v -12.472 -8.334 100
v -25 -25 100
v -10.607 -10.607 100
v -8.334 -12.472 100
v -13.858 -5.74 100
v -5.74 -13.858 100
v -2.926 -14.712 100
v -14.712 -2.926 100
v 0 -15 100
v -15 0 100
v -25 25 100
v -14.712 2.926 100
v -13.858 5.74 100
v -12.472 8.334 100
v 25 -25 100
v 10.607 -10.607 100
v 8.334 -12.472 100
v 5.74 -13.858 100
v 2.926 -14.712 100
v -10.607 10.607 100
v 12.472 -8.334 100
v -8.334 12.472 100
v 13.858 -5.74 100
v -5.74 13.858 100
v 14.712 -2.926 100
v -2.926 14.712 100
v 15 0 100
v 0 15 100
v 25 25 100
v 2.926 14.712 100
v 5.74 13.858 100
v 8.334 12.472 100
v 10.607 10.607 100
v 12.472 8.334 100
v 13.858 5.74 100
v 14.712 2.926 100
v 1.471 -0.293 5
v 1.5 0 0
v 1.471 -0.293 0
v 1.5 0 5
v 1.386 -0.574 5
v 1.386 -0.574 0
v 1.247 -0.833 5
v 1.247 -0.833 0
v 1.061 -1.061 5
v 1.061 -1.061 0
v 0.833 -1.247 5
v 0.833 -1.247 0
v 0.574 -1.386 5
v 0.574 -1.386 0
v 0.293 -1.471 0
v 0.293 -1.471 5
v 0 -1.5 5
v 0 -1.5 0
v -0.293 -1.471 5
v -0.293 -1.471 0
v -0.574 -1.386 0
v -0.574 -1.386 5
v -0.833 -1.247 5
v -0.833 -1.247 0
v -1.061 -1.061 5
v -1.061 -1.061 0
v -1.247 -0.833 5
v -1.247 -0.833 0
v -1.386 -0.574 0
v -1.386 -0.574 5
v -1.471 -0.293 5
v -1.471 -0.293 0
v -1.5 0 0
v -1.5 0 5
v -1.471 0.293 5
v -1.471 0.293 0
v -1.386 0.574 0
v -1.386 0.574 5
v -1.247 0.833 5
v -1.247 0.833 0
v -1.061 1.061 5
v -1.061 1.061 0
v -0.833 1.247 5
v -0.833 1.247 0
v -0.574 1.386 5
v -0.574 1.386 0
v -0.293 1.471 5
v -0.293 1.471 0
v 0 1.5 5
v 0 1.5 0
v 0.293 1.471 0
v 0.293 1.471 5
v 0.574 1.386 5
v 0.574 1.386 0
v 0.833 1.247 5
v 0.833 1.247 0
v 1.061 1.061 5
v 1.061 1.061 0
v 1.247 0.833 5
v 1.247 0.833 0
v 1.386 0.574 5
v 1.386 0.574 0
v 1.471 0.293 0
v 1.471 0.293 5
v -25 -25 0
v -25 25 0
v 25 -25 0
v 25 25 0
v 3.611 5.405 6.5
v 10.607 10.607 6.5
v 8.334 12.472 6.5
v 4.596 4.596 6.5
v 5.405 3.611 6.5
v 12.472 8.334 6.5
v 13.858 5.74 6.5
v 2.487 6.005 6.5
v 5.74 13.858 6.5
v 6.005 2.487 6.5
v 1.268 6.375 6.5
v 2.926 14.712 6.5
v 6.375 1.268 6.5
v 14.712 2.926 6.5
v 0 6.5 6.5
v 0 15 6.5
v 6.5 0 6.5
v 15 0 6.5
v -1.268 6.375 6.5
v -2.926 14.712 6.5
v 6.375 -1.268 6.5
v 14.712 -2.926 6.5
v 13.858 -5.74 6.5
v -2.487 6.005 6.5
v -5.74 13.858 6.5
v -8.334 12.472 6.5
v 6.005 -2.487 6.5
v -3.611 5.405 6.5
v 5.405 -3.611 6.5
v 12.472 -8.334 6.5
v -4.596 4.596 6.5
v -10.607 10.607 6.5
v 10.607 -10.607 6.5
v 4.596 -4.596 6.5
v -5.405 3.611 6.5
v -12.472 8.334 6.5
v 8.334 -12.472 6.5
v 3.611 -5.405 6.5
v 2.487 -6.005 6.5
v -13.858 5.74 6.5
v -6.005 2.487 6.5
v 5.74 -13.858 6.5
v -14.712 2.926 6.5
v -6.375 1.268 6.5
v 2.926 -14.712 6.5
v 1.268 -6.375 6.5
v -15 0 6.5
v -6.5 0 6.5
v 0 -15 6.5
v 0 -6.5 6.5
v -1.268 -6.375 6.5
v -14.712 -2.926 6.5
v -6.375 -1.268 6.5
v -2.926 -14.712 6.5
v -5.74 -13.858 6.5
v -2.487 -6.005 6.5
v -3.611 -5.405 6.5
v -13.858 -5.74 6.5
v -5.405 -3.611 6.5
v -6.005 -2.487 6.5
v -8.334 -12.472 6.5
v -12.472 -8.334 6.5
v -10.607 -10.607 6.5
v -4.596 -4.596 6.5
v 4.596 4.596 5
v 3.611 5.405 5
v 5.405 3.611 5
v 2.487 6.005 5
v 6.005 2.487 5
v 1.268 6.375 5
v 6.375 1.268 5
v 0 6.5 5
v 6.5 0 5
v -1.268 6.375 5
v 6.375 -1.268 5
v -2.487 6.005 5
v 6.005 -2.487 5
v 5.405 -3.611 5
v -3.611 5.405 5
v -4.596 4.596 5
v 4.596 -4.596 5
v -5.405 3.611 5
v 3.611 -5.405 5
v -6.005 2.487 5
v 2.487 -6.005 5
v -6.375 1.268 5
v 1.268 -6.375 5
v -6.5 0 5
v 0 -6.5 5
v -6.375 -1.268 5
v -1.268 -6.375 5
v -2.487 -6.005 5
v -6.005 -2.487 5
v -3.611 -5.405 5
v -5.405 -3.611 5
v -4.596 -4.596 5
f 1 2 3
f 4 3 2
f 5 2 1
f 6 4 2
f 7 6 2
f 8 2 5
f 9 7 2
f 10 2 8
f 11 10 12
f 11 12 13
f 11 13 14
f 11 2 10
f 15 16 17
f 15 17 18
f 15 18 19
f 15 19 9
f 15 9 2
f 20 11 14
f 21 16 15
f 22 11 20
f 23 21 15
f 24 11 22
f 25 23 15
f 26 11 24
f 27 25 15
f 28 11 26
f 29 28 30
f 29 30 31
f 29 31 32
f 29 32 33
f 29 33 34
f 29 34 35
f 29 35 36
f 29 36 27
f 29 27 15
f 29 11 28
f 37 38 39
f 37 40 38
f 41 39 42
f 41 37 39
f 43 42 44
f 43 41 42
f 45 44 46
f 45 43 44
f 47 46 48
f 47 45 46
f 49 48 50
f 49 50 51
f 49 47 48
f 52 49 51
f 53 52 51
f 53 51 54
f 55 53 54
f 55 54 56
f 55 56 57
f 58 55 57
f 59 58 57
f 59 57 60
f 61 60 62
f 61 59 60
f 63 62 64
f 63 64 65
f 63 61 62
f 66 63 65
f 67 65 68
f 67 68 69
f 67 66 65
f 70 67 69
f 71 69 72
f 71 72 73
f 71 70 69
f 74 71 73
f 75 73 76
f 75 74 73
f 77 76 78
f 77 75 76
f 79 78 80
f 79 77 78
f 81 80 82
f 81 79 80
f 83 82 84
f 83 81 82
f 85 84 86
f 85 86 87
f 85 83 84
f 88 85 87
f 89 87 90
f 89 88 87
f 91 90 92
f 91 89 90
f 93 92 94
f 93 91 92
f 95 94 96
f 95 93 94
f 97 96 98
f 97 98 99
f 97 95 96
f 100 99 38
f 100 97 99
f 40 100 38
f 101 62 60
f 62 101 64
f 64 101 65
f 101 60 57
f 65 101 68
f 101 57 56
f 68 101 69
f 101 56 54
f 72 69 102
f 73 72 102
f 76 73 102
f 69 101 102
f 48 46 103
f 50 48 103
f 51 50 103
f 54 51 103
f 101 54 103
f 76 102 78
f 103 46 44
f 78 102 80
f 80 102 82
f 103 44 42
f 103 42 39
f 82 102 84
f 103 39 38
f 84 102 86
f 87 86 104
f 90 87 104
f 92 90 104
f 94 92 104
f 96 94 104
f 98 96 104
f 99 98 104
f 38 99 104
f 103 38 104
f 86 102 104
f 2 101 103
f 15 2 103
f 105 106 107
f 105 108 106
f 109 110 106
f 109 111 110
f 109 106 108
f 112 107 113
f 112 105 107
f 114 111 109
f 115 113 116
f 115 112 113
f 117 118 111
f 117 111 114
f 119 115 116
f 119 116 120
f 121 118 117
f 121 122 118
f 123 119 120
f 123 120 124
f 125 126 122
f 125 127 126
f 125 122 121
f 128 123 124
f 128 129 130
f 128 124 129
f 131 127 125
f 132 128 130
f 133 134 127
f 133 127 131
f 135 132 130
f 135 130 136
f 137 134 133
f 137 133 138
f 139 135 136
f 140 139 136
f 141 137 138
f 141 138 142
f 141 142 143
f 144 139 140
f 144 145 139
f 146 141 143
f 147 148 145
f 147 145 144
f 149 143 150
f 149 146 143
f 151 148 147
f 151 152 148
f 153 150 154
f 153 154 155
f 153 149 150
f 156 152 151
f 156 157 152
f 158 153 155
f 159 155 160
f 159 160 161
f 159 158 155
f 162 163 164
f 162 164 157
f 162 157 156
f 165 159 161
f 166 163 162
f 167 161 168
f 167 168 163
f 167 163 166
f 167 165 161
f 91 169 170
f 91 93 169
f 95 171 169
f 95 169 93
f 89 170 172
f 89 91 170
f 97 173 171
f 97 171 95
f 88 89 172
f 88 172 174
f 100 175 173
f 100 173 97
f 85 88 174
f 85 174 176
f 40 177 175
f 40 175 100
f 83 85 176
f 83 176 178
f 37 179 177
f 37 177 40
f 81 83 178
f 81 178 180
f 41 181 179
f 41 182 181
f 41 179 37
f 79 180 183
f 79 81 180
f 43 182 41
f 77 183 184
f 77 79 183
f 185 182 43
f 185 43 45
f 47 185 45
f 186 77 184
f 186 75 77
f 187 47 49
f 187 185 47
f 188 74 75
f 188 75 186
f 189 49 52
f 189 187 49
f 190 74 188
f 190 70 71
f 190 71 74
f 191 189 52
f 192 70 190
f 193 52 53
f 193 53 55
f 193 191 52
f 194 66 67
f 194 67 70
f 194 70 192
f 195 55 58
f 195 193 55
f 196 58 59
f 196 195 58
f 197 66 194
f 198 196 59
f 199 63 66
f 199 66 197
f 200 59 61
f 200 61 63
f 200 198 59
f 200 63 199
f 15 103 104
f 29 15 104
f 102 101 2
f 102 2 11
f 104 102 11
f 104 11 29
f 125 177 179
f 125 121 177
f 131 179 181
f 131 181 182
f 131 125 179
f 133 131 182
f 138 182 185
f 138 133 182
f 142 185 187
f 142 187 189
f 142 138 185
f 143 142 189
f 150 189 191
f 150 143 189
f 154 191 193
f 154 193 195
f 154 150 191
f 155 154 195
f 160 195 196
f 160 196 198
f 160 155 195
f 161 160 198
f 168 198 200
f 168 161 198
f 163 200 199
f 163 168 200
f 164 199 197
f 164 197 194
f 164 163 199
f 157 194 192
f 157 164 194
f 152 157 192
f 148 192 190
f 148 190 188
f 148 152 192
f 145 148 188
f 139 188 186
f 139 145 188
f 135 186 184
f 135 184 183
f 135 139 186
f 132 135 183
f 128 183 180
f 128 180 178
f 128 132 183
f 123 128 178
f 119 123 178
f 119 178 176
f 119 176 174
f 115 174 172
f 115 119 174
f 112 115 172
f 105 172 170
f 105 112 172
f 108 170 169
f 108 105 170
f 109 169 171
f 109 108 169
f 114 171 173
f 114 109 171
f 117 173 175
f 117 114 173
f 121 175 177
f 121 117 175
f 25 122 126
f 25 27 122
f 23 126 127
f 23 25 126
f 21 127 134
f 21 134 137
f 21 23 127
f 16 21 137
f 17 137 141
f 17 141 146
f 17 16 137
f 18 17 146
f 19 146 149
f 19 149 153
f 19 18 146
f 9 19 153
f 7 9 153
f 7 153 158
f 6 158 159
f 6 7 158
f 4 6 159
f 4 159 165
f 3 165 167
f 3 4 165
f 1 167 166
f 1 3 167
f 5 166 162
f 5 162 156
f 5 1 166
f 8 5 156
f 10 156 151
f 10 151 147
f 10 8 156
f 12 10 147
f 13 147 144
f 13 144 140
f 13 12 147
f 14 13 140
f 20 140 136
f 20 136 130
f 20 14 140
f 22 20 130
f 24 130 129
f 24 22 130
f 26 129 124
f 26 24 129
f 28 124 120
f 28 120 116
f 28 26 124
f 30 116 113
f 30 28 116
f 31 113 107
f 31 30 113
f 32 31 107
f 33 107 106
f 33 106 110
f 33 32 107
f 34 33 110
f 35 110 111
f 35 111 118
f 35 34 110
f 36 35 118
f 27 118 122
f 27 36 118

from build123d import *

# Parameters (mm, degrees)
F0_W     = 50
F0_H     = 50
F1_DEPTH = 100


with BuildPart() as f1:
    # F0 (on Top) → F1 (new body)
    with BuildSketch(Plane.XY):
        Rectangle(F0_W, F0_H)
    extrude(amount=F1_DEPTH)

    # F2 (on Front) → F3 (revolve, cut)
    with BuildSketch(Plane.XZ):
        Polygon((0, 0), (1.5, 0), (1.5, 5), (6.5, 5), (6.5, 6.5), (15, 6.5), (15, 100), (0, 100), align=None)
    revolve(axis=Axis((0, 0, 50), (0, 0, -1)), mode=Mode.SUBTRACT)


solid = f1.part
